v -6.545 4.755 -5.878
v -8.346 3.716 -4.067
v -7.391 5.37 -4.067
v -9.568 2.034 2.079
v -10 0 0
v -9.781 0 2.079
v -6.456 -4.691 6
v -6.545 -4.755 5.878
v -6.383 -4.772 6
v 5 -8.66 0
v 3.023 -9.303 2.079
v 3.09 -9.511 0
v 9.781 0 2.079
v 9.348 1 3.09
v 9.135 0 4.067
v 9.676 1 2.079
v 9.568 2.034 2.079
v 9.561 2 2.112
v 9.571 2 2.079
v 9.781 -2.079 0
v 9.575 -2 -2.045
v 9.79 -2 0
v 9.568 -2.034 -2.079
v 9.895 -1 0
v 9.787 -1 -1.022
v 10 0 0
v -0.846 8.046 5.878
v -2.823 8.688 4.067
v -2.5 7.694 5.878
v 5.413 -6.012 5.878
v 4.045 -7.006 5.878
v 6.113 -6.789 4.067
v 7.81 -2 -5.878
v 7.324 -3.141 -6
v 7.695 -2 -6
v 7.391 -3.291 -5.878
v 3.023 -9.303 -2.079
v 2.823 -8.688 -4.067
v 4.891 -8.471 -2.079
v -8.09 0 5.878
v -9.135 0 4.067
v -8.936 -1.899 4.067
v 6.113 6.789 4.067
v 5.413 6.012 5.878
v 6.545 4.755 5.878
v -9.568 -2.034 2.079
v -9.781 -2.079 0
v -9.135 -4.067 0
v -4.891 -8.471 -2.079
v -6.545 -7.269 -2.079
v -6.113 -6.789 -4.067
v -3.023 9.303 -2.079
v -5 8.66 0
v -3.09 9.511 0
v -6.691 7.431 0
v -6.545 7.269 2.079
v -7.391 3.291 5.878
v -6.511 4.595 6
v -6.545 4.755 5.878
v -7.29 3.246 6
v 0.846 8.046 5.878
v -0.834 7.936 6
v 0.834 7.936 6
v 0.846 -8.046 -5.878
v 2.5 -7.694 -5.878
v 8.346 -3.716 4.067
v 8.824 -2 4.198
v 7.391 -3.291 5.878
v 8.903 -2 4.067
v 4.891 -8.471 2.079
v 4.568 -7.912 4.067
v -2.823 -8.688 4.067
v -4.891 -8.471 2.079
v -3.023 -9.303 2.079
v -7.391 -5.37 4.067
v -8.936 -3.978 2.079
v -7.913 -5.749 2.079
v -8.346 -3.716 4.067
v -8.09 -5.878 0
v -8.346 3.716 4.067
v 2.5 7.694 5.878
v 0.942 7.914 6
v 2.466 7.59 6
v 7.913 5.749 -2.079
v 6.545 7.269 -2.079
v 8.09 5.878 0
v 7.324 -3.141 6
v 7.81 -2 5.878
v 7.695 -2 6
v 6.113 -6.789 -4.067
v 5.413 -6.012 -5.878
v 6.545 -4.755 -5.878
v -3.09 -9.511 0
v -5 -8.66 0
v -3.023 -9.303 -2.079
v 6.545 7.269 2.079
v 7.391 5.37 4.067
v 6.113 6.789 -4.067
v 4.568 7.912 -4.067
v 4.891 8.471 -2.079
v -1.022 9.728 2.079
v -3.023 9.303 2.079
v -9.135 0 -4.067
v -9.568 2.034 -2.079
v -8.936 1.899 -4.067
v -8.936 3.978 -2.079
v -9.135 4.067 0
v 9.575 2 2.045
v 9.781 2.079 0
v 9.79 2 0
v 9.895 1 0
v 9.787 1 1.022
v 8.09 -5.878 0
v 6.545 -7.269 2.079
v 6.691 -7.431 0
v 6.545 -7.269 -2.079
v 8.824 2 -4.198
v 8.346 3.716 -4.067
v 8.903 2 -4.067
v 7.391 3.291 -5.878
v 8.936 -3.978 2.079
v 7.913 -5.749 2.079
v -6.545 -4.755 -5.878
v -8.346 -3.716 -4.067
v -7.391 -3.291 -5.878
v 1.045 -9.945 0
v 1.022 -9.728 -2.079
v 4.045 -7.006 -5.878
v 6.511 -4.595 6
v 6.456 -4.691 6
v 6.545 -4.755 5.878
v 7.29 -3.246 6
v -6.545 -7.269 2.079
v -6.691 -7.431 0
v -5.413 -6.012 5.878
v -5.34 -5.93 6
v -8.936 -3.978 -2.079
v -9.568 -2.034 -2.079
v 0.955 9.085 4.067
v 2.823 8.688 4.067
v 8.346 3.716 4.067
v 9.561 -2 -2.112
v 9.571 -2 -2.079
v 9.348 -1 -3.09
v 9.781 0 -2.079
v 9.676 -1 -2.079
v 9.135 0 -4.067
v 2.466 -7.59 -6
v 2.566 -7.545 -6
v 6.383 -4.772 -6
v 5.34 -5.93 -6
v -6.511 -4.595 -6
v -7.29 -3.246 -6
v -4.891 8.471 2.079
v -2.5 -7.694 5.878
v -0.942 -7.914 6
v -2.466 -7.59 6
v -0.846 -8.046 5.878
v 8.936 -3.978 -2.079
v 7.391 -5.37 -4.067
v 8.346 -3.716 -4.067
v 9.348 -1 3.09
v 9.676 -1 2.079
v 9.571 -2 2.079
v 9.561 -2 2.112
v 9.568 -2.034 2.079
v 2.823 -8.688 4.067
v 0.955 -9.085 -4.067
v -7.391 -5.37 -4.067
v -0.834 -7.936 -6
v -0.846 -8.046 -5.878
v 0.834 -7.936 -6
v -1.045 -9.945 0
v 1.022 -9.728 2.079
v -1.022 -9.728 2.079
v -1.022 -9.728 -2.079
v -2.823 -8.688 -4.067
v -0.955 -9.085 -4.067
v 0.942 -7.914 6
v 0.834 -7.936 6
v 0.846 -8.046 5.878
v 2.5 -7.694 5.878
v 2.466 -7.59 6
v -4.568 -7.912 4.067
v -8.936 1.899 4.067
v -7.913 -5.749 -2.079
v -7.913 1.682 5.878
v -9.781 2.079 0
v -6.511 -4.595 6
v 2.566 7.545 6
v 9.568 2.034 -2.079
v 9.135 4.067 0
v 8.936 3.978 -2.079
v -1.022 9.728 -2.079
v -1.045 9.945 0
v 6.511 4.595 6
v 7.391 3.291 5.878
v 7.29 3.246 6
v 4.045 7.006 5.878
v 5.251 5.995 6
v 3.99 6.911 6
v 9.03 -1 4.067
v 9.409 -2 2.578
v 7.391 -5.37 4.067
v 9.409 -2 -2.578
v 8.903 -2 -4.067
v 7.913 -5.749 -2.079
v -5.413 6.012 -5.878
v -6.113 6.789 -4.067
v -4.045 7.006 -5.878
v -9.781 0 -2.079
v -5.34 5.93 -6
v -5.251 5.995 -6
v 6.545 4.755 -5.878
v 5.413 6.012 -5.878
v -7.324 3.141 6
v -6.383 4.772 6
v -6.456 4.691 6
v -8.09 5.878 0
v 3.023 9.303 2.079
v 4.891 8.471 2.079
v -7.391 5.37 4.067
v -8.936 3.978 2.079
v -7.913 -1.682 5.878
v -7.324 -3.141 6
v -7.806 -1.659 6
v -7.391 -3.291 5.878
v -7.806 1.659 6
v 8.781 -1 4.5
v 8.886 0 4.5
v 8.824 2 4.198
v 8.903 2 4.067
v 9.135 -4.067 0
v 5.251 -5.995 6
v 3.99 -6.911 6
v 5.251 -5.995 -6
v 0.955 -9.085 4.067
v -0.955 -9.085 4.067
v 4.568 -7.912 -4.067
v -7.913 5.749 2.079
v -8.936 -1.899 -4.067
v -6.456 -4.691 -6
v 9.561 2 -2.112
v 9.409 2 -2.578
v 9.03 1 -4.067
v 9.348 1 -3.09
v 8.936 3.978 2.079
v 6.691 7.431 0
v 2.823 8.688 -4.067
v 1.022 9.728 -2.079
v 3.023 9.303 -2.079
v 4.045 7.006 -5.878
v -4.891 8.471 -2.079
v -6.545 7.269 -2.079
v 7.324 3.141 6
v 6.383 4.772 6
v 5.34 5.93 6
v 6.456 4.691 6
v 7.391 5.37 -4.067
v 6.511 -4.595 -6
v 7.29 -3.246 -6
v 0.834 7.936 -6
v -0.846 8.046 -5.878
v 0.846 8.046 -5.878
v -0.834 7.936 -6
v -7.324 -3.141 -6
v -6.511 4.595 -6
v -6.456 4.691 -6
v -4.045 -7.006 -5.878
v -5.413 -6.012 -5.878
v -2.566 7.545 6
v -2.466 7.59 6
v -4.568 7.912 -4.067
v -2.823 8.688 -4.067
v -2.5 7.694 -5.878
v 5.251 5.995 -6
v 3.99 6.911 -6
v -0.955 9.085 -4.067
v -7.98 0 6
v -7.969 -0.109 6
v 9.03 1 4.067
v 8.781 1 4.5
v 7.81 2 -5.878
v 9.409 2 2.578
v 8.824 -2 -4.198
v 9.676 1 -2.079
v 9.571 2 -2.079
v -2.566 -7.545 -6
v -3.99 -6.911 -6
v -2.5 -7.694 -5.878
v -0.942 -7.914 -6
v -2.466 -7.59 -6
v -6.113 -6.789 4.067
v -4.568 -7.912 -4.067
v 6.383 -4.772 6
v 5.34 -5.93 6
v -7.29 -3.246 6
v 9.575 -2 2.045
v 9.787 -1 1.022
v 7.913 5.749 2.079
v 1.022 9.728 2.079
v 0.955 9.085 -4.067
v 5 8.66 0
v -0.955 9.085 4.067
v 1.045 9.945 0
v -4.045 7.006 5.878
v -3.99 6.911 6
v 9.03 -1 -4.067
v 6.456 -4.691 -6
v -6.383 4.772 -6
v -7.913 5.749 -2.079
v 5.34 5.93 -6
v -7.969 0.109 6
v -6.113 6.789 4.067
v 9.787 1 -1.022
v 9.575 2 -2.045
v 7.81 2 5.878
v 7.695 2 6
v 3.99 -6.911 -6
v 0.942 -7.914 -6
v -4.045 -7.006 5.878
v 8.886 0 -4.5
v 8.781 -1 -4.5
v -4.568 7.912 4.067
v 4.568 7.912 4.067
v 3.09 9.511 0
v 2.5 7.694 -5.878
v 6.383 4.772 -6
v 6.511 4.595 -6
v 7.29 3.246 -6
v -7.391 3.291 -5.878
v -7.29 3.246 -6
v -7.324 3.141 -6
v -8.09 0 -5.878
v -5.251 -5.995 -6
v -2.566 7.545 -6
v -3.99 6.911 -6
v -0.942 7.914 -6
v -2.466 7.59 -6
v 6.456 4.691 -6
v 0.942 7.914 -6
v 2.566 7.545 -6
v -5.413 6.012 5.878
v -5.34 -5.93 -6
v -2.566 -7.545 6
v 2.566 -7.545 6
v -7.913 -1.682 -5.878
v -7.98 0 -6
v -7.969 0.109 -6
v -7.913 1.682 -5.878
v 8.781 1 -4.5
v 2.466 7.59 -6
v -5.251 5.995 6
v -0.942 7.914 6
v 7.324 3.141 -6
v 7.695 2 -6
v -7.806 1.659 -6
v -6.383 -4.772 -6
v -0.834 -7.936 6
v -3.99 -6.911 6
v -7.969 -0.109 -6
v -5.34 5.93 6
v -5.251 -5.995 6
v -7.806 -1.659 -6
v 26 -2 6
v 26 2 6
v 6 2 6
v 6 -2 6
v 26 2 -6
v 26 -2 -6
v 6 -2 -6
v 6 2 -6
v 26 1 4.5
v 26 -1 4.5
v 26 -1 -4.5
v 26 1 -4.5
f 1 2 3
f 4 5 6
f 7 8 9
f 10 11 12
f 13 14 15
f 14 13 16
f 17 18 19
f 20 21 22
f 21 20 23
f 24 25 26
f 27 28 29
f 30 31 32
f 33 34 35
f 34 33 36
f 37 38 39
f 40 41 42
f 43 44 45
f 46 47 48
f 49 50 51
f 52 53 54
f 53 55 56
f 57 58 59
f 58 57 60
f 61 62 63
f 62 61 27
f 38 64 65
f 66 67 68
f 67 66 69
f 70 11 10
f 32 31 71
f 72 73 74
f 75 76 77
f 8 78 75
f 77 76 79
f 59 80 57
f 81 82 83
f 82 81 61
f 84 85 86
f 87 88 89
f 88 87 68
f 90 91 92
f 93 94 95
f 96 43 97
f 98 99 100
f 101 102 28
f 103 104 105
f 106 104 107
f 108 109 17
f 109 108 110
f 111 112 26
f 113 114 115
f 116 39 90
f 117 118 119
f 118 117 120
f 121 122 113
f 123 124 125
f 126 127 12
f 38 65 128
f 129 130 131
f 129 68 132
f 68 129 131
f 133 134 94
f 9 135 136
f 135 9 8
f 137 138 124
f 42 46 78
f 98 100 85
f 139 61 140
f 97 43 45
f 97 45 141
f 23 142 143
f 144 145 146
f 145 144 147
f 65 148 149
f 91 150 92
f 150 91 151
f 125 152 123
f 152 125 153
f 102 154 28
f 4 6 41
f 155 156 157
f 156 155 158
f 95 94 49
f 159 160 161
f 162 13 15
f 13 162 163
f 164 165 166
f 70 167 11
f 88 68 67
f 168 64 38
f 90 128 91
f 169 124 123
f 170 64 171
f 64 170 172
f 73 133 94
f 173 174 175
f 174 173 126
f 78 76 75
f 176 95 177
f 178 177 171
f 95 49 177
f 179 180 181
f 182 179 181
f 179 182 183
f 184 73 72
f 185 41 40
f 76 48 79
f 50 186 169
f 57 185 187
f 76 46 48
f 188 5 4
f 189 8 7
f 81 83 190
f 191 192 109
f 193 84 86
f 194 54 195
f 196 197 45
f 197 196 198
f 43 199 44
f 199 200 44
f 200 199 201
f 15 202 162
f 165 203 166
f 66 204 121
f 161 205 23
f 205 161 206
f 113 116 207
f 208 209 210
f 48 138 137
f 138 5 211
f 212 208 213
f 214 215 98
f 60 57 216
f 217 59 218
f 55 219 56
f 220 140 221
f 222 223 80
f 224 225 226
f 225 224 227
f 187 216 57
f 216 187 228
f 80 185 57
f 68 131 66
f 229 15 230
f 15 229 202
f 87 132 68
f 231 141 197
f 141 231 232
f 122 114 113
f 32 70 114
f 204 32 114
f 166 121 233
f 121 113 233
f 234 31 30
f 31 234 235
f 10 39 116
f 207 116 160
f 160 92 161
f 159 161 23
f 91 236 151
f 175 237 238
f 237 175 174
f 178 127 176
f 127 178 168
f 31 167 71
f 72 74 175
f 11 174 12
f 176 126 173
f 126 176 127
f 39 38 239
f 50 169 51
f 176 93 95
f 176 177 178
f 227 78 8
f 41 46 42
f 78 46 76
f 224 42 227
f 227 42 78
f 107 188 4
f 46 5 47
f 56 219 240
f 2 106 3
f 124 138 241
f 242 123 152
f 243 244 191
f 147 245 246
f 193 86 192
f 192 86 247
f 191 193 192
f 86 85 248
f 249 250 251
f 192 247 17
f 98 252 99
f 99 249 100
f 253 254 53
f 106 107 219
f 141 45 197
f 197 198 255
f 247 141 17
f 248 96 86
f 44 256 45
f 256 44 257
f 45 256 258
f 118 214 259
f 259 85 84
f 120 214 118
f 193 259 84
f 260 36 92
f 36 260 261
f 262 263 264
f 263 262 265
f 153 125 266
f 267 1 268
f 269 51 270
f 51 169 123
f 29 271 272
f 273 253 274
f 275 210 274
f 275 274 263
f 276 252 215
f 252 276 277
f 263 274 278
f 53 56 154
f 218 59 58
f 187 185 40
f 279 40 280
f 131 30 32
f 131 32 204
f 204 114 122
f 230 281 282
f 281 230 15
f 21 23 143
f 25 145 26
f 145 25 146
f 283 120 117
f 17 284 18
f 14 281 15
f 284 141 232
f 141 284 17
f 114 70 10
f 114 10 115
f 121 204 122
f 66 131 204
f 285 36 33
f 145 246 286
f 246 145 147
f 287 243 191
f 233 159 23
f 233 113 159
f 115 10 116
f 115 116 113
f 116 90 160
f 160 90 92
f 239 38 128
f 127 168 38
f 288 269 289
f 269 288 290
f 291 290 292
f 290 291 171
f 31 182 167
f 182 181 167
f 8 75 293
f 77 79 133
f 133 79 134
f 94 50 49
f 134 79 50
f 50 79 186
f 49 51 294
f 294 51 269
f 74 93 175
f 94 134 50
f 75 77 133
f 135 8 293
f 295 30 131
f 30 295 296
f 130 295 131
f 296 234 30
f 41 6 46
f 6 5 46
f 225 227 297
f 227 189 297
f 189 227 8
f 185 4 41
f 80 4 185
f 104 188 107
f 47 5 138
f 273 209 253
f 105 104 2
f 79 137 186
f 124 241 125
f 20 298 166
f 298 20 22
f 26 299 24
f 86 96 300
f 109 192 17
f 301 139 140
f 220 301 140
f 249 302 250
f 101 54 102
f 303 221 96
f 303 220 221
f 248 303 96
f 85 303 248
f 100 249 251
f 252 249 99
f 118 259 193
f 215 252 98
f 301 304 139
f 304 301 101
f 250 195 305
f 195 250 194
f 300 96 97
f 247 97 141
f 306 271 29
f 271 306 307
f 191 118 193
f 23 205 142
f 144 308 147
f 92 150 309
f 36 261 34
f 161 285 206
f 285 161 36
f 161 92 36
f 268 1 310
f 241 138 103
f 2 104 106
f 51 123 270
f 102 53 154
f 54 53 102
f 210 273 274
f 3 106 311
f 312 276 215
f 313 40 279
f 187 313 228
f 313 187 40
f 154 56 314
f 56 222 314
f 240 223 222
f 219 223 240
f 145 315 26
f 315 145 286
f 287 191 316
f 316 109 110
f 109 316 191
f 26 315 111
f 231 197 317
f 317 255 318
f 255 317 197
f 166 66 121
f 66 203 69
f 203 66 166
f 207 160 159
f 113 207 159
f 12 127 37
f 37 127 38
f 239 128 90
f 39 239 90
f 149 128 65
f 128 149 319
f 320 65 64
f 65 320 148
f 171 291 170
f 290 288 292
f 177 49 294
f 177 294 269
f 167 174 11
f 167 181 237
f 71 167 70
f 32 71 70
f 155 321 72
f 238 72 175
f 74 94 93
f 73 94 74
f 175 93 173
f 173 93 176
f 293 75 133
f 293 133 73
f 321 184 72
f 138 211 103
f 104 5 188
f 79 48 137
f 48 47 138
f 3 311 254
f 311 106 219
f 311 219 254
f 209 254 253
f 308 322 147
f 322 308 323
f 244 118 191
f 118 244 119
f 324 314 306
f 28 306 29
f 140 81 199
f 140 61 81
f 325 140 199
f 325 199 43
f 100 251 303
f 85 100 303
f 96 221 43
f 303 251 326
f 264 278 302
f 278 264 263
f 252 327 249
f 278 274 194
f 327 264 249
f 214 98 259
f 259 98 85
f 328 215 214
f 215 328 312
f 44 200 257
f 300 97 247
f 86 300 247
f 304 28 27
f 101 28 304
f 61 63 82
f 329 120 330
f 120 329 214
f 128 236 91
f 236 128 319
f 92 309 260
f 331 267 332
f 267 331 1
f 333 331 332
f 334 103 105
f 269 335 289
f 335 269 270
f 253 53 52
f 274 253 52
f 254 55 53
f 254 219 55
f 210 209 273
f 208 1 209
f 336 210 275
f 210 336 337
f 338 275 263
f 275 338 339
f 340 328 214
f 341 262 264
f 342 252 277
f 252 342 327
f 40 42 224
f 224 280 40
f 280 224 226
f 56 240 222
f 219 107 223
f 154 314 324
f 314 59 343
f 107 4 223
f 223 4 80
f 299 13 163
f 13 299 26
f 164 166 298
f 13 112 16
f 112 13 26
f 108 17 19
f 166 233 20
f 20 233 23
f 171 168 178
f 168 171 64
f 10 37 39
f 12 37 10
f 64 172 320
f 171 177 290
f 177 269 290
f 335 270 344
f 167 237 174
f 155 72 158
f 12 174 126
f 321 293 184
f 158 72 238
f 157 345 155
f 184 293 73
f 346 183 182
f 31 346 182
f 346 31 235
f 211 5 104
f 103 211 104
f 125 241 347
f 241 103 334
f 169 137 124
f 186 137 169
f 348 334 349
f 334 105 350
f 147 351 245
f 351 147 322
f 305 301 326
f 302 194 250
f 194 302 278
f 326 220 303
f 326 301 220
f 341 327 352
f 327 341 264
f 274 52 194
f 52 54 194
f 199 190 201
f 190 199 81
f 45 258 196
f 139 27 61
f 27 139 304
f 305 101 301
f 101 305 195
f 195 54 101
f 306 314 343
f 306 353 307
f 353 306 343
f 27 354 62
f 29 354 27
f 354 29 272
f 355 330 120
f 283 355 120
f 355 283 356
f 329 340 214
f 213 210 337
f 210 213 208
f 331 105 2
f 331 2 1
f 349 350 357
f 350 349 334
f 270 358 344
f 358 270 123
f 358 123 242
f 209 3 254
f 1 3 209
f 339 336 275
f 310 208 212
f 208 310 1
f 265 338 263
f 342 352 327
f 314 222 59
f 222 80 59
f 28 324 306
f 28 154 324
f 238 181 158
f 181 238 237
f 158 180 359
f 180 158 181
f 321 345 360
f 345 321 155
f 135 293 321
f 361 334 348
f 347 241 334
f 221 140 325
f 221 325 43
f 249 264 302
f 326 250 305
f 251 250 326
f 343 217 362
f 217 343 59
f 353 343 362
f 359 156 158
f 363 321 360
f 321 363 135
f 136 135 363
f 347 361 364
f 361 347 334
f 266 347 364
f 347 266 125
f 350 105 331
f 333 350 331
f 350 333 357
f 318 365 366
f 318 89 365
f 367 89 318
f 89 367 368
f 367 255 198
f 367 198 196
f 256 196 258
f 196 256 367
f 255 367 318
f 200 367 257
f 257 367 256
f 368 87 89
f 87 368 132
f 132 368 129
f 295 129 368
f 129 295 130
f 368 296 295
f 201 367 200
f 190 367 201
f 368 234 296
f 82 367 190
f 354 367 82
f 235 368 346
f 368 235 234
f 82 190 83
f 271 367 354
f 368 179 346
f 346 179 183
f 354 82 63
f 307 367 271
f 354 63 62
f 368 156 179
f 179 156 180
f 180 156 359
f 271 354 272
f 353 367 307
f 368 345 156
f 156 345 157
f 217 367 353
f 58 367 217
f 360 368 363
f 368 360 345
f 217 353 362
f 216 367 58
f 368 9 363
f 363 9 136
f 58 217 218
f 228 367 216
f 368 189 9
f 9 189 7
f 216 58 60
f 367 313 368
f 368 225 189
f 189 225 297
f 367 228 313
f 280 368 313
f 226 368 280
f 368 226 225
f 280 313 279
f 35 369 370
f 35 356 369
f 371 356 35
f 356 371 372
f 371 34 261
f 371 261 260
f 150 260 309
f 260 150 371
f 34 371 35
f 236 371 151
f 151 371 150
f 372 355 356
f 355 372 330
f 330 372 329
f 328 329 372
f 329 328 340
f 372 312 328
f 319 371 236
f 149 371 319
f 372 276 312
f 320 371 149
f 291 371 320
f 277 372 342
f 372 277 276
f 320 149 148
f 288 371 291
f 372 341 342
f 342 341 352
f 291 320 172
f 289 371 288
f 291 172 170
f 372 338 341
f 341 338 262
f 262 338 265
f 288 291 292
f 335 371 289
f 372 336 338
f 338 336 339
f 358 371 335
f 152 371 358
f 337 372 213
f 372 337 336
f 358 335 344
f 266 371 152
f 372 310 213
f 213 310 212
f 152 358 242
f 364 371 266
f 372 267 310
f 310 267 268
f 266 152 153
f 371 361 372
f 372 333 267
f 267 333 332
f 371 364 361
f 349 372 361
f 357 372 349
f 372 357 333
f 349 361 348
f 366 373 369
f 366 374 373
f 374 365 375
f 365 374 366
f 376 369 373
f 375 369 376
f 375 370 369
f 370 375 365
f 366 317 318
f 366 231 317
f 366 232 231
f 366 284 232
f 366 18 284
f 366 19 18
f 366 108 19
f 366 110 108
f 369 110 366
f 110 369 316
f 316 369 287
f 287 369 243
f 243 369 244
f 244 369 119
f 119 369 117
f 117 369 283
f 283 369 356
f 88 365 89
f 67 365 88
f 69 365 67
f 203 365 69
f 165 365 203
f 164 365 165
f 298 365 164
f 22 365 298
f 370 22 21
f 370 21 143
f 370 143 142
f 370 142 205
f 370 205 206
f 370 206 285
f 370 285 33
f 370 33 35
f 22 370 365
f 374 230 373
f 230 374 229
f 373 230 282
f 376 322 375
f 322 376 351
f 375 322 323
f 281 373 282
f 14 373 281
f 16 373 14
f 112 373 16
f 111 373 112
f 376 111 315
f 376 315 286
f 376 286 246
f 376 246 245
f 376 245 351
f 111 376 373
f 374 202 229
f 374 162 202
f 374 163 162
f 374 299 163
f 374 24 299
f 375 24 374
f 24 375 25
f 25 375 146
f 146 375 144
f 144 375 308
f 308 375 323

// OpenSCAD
group() {
  difference() {
    sphere(d = 20);
    translate([0, 0, 12]) {
      color("pink") {
        cube([20, 20, 12], center = true);
      }
    }
    translate([0, 0, -12]) {
      color("pink") {
        cube([20, 20, 12], center = true);
      }
    }
  }
  translate([16, 0, 0]) {
    difference() {
      color("red") {
        cube([20, 4, 12], center = true);
      }
      color("blue") {
        cube([20, 2, 9], center = true);
      }
    }
  }
}
